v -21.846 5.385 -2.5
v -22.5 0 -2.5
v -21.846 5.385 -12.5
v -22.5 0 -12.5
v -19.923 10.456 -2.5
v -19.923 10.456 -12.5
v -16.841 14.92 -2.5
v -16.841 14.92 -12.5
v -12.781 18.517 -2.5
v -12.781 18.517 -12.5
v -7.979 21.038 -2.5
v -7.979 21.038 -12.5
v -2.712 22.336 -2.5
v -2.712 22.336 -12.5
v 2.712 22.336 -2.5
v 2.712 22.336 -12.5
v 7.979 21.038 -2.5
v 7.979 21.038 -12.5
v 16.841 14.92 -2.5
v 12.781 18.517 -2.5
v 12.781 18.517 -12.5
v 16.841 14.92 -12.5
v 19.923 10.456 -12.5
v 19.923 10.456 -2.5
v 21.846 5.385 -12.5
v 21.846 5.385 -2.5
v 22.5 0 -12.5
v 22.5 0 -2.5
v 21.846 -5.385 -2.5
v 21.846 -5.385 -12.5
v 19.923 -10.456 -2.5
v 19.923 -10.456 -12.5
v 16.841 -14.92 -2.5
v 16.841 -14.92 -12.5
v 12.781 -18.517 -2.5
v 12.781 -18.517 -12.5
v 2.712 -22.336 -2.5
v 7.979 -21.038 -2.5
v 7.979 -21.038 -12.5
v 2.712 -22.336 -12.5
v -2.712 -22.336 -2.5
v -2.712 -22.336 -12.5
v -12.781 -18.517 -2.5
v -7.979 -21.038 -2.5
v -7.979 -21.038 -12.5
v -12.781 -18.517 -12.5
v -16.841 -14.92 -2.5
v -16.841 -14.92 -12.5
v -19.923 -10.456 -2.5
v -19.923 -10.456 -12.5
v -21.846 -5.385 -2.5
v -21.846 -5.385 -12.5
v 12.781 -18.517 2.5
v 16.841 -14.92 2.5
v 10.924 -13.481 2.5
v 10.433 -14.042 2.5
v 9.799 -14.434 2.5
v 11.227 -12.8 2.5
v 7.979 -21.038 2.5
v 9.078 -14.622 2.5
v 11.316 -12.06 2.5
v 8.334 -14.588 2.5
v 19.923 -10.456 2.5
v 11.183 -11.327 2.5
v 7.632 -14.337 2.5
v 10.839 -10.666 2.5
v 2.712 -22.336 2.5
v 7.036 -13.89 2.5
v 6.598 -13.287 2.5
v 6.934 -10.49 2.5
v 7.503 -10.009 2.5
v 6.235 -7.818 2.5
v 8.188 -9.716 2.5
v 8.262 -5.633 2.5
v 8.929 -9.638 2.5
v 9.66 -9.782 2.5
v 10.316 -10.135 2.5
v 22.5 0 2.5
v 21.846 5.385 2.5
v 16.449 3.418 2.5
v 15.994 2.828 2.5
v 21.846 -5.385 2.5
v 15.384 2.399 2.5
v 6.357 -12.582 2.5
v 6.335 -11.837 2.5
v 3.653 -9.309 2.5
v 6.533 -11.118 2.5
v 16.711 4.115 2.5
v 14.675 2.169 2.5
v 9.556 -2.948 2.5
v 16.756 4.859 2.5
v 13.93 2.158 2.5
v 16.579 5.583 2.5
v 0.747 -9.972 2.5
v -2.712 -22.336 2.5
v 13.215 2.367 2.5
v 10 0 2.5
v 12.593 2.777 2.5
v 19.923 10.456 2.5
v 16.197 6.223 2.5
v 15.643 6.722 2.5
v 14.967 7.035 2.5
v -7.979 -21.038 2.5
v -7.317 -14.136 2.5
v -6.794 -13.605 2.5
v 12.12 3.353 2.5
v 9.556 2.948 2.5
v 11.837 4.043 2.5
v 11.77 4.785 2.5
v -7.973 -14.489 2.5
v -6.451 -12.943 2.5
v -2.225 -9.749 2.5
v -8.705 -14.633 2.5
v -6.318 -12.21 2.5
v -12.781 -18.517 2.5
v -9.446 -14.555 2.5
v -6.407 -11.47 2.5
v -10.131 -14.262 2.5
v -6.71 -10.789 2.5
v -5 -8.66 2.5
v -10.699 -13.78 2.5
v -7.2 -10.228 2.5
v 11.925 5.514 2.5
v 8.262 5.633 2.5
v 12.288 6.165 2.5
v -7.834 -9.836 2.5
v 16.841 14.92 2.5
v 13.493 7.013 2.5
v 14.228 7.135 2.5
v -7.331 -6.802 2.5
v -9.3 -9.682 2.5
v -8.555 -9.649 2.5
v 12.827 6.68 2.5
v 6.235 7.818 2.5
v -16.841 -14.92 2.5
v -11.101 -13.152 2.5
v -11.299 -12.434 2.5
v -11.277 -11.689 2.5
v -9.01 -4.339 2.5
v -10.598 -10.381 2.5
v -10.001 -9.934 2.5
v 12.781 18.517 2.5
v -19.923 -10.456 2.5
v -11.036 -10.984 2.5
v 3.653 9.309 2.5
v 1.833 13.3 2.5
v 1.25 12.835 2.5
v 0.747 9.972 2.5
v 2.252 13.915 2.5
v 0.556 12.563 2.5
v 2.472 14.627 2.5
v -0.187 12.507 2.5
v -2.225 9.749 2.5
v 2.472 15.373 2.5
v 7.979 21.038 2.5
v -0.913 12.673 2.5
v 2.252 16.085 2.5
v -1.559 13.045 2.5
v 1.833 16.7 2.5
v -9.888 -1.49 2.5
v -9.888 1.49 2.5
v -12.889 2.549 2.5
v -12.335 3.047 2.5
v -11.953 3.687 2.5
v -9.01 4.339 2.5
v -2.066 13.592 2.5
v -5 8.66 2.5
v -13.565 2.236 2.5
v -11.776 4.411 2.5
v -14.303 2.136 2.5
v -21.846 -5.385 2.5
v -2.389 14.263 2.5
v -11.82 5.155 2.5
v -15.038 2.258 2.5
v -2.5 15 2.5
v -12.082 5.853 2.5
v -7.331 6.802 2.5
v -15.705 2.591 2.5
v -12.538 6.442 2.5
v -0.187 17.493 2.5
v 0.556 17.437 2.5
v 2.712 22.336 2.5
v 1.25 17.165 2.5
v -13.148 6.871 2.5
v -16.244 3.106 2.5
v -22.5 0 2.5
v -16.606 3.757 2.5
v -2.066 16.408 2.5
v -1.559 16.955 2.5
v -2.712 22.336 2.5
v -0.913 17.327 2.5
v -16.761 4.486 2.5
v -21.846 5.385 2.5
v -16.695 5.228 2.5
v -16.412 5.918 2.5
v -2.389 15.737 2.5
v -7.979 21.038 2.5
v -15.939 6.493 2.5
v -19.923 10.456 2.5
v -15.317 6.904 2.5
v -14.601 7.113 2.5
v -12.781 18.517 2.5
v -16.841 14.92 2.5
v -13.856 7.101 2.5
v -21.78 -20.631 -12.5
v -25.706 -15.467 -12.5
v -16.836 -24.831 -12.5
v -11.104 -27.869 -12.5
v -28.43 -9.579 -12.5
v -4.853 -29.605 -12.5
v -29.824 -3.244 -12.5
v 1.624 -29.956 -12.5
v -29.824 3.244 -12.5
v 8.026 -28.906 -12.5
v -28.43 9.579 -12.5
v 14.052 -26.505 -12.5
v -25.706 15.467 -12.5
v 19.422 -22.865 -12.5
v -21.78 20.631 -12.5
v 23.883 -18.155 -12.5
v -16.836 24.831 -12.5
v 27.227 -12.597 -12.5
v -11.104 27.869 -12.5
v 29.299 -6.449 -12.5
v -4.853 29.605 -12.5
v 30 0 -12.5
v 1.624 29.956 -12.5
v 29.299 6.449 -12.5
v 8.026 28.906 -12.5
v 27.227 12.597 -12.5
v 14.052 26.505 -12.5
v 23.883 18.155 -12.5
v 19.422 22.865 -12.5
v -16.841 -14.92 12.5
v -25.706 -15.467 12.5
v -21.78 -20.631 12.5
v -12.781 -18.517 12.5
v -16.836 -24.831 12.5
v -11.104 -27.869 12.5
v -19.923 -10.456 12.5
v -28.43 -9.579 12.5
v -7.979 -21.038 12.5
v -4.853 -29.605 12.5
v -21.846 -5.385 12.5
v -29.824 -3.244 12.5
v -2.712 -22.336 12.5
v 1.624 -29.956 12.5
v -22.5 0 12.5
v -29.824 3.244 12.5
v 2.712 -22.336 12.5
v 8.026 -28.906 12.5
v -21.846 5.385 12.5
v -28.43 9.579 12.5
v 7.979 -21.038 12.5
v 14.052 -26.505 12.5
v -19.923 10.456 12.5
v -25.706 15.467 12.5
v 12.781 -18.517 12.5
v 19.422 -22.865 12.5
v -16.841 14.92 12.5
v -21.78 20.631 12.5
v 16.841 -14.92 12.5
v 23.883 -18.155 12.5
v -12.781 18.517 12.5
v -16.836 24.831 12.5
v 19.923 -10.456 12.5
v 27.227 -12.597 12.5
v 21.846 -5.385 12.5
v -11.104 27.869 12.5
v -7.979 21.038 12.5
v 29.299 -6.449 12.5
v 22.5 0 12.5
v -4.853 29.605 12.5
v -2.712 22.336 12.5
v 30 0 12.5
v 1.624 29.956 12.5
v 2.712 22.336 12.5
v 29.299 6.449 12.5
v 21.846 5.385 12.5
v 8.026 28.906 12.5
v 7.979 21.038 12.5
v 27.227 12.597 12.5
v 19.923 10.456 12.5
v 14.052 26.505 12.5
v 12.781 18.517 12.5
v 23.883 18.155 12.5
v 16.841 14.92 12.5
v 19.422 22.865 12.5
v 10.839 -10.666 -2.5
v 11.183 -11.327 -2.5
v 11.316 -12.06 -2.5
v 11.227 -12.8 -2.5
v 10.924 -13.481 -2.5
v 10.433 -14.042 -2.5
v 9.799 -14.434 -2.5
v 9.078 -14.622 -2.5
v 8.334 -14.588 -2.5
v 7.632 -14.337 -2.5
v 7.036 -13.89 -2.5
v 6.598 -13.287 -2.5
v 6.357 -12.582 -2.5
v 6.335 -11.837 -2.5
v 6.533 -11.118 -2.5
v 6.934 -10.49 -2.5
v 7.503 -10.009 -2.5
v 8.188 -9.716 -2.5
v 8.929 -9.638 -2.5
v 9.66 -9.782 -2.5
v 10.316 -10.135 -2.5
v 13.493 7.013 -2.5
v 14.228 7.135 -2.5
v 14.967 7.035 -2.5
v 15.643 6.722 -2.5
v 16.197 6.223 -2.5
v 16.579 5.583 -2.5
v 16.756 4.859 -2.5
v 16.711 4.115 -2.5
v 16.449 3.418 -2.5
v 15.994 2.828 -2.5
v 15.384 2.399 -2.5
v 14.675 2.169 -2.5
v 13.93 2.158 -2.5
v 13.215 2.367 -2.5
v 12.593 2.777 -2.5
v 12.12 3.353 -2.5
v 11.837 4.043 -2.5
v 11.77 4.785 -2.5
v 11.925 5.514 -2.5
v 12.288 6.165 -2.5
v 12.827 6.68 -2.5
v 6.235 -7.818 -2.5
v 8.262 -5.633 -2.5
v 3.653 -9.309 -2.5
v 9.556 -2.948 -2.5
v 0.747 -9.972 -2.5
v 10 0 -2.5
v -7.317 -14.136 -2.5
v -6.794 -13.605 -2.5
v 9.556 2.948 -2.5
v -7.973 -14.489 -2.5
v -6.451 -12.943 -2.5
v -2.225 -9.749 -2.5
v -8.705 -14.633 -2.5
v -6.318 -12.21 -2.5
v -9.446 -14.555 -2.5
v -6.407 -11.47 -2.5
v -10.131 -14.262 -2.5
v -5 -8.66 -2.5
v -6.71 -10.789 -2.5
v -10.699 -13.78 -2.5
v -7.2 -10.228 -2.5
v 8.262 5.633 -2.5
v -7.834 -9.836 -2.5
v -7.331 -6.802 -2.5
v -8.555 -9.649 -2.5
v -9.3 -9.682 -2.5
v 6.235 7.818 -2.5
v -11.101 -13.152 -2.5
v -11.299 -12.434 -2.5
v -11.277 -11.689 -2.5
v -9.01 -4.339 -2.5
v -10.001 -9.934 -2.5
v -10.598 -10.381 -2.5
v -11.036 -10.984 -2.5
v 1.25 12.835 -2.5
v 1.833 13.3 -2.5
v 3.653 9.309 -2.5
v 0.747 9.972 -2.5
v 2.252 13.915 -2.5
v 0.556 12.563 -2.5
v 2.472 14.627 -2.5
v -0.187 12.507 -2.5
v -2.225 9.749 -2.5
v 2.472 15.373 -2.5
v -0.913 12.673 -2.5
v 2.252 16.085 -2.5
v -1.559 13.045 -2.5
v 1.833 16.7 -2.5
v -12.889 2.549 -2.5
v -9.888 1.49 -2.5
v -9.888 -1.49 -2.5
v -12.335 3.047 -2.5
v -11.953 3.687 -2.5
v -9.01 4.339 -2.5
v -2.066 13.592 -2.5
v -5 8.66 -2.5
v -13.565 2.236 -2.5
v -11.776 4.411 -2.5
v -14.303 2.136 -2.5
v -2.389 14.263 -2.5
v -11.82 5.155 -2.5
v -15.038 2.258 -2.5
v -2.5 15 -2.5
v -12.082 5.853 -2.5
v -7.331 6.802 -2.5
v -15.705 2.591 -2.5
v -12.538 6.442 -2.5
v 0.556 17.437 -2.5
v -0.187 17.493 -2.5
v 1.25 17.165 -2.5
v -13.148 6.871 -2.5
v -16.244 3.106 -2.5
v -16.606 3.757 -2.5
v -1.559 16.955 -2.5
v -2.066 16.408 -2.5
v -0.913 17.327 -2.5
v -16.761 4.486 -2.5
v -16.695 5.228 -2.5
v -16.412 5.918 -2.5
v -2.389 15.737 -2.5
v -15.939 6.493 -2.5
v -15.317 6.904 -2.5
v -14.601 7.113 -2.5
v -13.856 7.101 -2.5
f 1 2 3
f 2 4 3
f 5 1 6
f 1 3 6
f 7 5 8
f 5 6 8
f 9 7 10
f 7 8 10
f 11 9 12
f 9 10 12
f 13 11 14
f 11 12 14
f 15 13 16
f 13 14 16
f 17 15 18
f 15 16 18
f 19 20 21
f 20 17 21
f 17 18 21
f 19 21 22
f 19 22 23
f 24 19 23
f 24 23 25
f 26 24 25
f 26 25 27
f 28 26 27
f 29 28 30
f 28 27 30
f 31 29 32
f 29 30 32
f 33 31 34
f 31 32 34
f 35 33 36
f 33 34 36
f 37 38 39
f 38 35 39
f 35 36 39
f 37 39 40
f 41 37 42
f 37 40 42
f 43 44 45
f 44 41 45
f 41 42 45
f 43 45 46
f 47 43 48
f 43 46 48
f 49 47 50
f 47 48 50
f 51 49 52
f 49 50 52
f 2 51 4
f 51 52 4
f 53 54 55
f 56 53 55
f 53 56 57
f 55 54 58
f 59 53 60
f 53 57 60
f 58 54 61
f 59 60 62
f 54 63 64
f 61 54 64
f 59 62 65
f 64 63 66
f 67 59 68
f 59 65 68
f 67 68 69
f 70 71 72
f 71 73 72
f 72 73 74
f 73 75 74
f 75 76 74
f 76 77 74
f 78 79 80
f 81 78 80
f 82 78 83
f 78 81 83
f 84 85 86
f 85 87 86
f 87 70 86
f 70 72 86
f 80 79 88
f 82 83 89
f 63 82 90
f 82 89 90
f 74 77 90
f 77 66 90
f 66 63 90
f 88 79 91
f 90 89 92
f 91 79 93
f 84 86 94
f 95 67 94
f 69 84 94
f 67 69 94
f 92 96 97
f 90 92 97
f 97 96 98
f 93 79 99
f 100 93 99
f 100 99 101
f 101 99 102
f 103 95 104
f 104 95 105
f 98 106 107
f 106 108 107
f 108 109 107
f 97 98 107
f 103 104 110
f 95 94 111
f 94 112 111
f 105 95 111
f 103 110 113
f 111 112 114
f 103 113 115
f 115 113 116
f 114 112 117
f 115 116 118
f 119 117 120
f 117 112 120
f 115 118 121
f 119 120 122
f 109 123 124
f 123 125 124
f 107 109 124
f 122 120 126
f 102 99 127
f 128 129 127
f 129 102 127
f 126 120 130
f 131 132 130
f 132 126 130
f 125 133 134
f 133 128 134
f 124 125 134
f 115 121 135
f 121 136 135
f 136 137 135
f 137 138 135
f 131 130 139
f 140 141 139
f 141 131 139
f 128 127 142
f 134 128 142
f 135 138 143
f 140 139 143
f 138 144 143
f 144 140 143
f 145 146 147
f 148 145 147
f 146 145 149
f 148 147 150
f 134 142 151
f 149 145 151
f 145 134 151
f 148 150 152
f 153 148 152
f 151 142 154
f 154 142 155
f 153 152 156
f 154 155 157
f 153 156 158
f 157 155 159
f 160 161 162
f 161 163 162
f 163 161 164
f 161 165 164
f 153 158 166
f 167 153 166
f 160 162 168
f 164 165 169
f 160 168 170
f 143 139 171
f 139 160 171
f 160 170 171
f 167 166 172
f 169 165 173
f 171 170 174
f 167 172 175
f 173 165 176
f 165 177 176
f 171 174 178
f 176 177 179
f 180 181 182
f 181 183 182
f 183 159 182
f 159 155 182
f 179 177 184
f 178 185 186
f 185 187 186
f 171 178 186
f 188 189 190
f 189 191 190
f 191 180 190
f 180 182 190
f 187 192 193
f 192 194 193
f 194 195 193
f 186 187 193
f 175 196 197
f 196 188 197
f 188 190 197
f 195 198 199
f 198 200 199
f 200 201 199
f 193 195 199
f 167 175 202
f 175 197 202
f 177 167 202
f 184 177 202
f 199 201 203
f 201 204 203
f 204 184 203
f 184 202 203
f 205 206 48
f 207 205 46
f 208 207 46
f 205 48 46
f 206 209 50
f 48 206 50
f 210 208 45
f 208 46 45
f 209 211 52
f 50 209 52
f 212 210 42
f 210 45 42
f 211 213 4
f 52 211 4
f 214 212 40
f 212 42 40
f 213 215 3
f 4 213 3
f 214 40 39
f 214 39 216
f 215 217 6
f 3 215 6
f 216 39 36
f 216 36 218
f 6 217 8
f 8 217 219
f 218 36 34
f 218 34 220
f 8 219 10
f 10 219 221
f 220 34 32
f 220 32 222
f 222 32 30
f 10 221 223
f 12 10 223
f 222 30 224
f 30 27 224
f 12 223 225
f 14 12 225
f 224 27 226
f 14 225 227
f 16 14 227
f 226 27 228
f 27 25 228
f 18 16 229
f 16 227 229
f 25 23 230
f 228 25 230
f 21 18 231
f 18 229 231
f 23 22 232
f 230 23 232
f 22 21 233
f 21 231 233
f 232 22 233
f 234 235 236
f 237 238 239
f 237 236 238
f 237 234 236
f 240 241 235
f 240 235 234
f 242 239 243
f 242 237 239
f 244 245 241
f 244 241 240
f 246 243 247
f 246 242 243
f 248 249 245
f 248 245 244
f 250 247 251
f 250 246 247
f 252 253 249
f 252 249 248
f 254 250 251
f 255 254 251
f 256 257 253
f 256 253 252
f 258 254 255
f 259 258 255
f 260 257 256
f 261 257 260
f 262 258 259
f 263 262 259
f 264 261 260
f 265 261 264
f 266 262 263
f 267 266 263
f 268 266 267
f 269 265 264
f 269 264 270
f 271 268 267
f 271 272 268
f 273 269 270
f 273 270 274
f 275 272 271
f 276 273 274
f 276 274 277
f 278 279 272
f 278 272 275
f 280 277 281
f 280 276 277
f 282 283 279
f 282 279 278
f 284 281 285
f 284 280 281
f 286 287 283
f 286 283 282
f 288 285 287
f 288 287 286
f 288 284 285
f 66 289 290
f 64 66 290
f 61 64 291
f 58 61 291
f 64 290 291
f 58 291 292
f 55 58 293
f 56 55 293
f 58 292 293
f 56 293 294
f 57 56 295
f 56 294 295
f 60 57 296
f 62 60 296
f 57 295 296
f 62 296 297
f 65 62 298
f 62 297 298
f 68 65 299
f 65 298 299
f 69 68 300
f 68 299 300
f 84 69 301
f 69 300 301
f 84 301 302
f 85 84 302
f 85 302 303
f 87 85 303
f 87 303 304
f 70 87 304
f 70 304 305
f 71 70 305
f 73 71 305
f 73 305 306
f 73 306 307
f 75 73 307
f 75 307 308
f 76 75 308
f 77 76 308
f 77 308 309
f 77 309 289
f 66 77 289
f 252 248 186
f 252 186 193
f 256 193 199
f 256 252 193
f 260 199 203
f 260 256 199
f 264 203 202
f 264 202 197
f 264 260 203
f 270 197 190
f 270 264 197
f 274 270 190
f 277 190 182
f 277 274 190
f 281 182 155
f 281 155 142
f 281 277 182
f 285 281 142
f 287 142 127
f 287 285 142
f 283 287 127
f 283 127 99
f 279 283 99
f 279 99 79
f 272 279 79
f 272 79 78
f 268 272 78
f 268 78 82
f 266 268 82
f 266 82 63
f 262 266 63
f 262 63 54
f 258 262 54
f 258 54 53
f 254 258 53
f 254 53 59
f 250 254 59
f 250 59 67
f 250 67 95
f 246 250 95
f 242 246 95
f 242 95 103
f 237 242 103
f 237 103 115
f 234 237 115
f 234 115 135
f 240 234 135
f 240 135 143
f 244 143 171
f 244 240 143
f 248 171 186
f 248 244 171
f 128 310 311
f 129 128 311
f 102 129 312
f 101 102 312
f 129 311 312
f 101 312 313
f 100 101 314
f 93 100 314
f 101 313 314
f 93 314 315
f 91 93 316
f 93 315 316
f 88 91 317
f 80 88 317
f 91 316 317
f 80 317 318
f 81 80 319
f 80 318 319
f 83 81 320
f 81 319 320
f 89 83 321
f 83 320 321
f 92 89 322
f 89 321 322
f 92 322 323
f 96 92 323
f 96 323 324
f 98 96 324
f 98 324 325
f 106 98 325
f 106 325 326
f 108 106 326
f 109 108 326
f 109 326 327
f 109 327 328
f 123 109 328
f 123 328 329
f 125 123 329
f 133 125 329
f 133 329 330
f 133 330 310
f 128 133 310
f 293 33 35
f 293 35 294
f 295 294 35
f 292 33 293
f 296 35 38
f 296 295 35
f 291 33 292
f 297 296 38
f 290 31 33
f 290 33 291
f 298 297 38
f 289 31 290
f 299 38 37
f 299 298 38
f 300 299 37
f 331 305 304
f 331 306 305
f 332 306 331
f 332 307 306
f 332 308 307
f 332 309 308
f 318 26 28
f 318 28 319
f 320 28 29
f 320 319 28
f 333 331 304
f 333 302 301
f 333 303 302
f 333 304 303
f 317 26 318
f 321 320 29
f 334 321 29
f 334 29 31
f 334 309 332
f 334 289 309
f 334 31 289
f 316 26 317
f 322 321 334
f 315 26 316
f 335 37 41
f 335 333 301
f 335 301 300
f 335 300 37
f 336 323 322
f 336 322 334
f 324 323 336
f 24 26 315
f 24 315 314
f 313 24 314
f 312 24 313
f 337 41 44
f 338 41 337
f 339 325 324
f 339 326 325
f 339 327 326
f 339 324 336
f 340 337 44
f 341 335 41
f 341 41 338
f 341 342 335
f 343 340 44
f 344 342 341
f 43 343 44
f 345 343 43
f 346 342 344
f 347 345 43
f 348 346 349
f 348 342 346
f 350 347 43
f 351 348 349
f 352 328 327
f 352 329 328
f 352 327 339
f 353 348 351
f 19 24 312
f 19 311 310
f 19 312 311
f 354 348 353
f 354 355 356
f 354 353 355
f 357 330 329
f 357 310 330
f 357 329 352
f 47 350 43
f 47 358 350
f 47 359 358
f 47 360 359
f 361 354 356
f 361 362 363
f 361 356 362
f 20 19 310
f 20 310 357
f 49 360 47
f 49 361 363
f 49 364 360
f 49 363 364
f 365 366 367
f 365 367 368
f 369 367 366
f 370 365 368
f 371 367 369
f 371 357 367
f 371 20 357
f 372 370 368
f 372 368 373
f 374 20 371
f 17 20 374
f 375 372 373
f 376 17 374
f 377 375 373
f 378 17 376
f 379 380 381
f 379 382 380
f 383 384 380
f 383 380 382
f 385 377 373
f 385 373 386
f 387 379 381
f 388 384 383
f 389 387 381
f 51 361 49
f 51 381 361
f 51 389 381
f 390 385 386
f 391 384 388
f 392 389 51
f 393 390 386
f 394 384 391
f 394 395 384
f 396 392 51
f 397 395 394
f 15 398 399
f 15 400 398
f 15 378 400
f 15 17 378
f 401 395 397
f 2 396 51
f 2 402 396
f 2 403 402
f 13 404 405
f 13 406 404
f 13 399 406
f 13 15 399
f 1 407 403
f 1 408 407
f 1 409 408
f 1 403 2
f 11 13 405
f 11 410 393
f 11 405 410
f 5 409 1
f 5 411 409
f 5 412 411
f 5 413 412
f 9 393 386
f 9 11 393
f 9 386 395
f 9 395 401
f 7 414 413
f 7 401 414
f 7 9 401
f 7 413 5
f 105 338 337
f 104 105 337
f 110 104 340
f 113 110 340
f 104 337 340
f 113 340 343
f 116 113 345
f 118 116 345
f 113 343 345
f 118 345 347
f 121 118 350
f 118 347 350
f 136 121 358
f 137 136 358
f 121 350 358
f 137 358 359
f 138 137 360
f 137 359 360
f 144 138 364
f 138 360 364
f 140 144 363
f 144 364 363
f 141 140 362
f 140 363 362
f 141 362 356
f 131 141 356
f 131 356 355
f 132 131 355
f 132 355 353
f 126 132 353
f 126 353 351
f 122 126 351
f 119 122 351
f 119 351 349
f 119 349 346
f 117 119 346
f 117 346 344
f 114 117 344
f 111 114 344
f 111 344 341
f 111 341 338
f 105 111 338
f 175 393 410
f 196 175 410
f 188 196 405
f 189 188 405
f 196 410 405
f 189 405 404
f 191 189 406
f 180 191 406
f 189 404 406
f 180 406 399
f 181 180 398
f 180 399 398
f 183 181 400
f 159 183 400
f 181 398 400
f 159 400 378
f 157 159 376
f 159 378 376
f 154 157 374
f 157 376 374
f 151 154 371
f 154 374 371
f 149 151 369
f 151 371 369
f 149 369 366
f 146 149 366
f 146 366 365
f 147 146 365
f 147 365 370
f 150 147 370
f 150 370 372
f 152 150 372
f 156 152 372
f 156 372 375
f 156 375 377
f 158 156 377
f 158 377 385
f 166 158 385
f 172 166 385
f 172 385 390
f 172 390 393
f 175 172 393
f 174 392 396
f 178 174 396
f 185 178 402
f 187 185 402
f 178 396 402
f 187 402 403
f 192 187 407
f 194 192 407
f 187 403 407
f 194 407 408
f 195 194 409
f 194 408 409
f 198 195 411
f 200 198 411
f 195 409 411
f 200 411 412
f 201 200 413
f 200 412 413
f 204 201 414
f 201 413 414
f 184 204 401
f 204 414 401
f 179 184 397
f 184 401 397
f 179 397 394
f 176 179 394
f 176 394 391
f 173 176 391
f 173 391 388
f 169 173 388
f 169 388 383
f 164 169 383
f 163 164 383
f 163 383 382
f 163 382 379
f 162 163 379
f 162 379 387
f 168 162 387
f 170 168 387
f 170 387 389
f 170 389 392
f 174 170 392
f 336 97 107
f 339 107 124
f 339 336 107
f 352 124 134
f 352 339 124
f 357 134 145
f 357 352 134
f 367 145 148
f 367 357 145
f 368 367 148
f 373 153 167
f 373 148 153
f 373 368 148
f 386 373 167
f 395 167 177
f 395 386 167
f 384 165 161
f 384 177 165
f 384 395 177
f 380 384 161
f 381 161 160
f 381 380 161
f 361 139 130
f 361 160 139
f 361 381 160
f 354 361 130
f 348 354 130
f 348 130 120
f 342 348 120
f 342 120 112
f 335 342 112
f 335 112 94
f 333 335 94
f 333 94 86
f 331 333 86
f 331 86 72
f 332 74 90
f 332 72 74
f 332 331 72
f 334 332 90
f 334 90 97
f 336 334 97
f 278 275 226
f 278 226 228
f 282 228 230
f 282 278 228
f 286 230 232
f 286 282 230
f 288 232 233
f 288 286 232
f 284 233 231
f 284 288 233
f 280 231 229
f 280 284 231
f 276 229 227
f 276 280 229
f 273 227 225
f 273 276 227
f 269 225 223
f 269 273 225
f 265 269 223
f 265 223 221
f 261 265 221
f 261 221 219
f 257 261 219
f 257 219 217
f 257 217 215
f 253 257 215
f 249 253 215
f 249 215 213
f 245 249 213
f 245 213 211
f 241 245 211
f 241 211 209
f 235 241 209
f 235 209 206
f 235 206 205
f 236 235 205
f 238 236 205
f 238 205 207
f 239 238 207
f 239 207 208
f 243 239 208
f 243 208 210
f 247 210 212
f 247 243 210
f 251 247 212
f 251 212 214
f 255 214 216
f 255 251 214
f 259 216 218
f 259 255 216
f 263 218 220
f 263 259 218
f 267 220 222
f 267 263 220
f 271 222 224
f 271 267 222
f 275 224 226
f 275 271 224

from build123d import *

# Parameters (mm, degrees)
SKETCH1_R           = 30
SKETCH1_R_2         = 10
BOSS_EXTRUDE1_DEPTH = 12.5
SKETCH2_R           = 22.5
CUT_EXTRUDE1_DEPTH  = 10
SKETCH3_R           = 2.5
CUT_EXTRUDE2_DEPTH  = 16
CIRPATTERN3_COUNT   = 5
CIRPATTERN2_COUNT   = 5


with BuildPart() as part:
    # Sketch1 → Boss-Extrude1 (new body, symmetric)
    with BuildSketch(Plane.XY):
        Circle(SKETCH1_R)
        Circle(SKETCH1_R_2, mode=Mode.SUBTRACT)
    extrude(amount=BOSS_EXTRUDE1_DEPTH, both=True)

    # Sketch2 → Cut-Extrude1 (cut)
    with BuildSketch(Plane(origin=(0, 0, -12.5), x_dir=(-1, 0, 0), z_dir=(0, 0, -1))):
        Circle(SKETCH2_R)
    cut_extrude1 = extrude(amount=-CUT_EXTRUDE1_DEPTH, mode=Mode.SUBTRACT)

    # Mirror1: Cut-Extrude1 across plane
    add(cut_extrude1.mirror(Plane.XY), mode=Mode.SUBTRACT)

    # Sketch3 → Cut-Extrude2 (cut, through all)
    with BuildSketch(Plane(origin=(0, 0, -2.5), x_dir=(-1, 0, 0), z_dir=(0, 0, -1))):
        with Locations((0, 15)):
            Circle(SKETCH3_R)
    cut_extrude2 = extrude(amount=-CUT_EXTRUDE2_DEPTH, mode=Mode.SUBTRACT)

    # CirPattern3: Cut-Extrude2 ×5 about axis
    cirpattern3_axis = Axis((0, 0, 0), (0, 0, 1))
    for i in range(1, CIRPATTERN3_COUNT):
        add(cut_extrude2.rotate(cirpattern3_axis, i * 360 / CIRPATTERN3_COUNT), mode=Mode.SUBTRACT)

    # CirPattern2: part ×5 about axis
    cirpattern2_axis = Axis((0, 0, 0), (0, 0, 1))


with BuildPart() as part_1:
    add(part.part)
    for i in range(1, CIRPATTERN2_COUNT):
        add(part.part.rotate(cirpattern2_axis, i * 360 / CIRPATTERN2_COUNT))


solid = part_1.part
